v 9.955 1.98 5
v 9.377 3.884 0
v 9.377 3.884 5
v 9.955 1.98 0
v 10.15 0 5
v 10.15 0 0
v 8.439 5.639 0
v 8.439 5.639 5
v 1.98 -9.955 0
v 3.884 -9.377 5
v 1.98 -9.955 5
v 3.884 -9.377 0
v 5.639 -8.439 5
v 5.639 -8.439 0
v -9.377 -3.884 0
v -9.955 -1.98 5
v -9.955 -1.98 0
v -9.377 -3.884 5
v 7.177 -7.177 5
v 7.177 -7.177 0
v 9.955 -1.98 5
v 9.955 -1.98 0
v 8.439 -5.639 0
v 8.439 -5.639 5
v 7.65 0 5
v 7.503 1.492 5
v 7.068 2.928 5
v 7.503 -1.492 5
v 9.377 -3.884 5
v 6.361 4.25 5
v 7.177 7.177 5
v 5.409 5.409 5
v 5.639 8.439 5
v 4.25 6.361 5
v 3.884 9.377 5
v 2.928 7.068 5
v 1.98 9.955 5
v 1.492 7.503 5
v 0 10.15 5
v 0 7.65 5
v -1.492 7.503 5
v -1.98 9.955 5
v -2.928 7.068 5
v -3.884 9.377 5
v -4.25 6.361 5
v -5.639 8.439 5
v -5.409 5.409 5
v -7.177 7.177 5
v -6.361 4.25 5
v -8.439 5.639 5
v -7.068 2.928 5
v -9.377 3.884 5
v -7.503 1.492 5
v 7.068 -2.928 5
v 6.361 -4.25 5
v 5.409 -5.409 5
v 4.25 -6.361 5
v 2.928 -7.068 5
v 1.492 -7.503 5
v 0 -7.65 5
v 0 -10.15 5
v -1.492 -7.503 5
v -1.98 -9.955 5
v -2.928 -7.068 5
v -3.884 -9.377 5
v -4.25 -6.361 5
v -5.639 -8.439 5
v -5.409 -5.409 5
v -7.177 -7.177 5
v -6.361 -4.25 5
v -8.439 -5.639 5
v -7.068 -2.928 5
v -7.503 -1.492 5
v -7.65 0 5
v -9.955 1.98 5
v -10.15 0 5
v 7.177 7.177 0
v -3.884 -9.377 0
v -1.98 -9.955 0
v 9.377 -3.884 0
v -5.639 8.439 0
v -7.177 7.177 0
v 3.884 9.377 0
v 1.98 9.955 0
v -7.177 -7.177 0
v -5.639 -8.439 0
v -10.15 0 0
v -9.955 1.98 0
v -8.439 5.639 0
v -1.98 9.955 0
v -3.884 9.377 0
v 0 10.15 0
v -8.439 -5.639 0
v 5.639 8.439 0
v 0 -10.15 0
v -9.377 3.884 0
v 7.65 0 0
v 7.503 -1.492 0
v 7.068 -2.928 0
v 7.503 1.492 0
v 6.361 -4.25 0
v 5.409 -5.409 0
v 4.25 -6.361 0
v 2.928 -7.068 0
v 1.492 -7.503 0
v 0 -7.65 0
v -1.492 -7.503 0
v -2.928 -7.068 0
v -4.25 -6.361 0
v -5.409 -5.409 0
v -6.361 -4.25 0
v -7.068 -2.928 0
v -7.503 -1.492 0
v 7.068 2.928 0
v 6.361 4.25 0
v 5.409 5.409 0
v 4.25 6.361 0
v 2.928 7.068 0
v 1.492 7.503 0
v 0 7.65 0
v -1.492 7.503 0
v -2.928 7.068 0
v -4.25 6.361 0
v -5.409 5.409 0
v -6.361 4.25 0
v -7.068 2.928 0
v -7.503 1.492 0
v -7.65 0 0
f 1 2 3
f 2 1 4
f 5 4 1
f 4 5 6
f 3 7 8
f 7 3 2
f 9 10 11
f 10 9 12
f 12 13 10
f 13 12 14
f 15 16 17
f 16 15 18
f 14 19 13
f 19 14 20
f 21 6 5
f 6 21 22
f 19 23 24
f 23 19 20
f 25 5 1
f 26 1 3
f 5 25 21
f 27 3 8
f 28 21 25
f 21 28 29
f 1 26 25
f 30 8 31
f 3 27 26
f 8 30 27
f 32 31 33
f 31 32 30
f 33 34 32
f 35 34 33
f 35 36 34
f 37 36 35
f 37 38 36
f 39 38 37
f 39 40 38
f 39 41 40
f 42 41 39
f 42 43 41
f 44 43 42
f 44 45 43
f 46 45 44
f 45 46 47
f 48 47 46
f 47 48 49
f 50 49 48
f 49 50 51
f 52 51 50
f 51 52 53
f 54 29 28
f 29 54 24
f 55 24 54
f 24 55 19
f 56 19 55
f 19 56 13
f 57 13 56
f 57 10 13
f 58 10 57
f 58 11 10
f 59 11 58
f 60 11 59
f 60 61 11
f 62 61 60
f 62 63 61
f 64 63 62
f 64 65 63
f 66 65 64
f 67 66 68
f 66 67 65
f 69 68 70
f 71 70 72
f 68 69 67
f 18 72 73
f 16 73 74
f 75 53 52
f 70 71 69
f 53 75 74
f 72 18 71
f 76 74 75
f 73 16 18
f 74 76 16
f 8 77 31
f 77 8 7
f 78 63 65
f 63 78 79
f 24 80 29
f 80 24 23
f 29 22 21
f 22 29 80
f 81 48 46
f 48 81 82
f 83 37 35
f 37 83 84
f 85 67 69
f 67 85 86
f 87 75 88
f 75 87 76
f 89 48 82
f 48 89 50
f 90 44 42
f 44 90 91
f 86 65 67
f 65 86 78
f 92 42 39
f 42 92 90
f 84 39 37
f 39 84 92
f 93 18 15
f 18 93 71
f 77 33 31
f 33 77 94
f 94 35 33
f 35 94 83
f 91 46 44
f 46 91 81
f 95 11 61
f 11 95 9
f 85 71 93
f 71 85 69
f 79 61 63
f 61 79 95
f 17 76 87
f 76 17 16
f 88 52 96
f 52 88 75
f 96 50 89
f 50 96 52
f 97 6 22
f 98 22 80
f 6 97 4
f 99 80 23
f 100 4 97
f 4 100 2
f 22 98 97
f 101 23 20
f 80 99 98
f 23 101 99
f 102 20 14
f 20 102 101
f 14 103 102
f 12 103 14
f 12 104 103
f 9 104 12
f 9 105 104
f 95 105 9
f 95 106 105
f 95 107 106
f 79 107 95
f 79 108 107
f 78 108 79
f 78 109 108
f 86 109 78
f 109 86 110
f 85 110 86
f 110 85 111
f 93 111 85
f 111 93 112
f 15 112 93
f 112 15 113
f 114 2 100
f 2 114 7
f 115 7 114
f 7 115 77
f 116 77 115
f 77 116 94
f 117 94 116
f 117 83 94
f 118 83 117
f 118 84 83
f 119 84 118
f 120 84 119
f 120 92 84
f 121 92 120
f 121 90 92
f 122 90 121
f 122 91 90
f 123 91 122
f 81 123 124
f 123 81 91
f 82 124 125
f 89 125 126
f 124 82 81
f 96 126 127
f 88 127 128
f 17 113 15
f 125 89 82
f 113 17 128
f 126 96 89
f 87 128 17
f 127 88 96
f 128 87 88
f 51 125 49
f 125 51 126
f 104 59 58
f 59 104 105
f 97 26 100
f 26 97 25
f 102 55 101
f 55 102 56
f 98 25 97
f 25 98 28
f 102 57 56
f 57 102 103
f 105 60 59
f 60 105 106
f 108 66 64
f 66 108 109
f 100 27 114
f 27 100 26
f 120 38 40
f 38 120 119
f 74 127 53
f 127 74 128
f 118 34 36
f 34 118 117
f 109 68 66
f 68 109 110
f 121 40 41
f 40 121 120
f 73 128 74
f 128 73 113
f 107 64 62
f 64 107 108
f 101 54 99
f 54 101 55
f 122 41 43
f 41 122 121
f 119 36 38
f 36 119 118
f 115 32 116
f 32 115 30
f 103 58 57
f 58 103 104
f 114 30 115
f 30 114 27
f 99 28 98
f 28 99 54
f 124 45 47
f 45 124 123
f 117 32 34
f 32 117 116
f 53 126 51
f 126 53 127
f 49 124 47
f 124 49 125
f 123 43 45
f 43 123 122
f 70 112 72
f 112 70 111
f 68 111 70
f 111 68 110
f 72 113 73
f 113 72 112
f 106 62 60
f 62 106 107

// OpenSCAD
$fn = 32;

// ----------------------------------------------------------------------
// Spacer sleeve: 20.3 / 15.3 x 5 mm
// ----------------------------------------------------------------------

// --- parameters (mm) ---
sleeve_od = 20.3;         // outside diameter
sleeve_id = 15.3;         // shaft bore
sleeve_l = 5;             // sleeve length

module sleeve() {
  cylinder(h = sleeve_l, d = sleeve_od);
}

difference() {
  sleeve();
  translate([0, 0, -1]) cylinder(h = sleeve_l + 2, d = sleeve_id);
}
